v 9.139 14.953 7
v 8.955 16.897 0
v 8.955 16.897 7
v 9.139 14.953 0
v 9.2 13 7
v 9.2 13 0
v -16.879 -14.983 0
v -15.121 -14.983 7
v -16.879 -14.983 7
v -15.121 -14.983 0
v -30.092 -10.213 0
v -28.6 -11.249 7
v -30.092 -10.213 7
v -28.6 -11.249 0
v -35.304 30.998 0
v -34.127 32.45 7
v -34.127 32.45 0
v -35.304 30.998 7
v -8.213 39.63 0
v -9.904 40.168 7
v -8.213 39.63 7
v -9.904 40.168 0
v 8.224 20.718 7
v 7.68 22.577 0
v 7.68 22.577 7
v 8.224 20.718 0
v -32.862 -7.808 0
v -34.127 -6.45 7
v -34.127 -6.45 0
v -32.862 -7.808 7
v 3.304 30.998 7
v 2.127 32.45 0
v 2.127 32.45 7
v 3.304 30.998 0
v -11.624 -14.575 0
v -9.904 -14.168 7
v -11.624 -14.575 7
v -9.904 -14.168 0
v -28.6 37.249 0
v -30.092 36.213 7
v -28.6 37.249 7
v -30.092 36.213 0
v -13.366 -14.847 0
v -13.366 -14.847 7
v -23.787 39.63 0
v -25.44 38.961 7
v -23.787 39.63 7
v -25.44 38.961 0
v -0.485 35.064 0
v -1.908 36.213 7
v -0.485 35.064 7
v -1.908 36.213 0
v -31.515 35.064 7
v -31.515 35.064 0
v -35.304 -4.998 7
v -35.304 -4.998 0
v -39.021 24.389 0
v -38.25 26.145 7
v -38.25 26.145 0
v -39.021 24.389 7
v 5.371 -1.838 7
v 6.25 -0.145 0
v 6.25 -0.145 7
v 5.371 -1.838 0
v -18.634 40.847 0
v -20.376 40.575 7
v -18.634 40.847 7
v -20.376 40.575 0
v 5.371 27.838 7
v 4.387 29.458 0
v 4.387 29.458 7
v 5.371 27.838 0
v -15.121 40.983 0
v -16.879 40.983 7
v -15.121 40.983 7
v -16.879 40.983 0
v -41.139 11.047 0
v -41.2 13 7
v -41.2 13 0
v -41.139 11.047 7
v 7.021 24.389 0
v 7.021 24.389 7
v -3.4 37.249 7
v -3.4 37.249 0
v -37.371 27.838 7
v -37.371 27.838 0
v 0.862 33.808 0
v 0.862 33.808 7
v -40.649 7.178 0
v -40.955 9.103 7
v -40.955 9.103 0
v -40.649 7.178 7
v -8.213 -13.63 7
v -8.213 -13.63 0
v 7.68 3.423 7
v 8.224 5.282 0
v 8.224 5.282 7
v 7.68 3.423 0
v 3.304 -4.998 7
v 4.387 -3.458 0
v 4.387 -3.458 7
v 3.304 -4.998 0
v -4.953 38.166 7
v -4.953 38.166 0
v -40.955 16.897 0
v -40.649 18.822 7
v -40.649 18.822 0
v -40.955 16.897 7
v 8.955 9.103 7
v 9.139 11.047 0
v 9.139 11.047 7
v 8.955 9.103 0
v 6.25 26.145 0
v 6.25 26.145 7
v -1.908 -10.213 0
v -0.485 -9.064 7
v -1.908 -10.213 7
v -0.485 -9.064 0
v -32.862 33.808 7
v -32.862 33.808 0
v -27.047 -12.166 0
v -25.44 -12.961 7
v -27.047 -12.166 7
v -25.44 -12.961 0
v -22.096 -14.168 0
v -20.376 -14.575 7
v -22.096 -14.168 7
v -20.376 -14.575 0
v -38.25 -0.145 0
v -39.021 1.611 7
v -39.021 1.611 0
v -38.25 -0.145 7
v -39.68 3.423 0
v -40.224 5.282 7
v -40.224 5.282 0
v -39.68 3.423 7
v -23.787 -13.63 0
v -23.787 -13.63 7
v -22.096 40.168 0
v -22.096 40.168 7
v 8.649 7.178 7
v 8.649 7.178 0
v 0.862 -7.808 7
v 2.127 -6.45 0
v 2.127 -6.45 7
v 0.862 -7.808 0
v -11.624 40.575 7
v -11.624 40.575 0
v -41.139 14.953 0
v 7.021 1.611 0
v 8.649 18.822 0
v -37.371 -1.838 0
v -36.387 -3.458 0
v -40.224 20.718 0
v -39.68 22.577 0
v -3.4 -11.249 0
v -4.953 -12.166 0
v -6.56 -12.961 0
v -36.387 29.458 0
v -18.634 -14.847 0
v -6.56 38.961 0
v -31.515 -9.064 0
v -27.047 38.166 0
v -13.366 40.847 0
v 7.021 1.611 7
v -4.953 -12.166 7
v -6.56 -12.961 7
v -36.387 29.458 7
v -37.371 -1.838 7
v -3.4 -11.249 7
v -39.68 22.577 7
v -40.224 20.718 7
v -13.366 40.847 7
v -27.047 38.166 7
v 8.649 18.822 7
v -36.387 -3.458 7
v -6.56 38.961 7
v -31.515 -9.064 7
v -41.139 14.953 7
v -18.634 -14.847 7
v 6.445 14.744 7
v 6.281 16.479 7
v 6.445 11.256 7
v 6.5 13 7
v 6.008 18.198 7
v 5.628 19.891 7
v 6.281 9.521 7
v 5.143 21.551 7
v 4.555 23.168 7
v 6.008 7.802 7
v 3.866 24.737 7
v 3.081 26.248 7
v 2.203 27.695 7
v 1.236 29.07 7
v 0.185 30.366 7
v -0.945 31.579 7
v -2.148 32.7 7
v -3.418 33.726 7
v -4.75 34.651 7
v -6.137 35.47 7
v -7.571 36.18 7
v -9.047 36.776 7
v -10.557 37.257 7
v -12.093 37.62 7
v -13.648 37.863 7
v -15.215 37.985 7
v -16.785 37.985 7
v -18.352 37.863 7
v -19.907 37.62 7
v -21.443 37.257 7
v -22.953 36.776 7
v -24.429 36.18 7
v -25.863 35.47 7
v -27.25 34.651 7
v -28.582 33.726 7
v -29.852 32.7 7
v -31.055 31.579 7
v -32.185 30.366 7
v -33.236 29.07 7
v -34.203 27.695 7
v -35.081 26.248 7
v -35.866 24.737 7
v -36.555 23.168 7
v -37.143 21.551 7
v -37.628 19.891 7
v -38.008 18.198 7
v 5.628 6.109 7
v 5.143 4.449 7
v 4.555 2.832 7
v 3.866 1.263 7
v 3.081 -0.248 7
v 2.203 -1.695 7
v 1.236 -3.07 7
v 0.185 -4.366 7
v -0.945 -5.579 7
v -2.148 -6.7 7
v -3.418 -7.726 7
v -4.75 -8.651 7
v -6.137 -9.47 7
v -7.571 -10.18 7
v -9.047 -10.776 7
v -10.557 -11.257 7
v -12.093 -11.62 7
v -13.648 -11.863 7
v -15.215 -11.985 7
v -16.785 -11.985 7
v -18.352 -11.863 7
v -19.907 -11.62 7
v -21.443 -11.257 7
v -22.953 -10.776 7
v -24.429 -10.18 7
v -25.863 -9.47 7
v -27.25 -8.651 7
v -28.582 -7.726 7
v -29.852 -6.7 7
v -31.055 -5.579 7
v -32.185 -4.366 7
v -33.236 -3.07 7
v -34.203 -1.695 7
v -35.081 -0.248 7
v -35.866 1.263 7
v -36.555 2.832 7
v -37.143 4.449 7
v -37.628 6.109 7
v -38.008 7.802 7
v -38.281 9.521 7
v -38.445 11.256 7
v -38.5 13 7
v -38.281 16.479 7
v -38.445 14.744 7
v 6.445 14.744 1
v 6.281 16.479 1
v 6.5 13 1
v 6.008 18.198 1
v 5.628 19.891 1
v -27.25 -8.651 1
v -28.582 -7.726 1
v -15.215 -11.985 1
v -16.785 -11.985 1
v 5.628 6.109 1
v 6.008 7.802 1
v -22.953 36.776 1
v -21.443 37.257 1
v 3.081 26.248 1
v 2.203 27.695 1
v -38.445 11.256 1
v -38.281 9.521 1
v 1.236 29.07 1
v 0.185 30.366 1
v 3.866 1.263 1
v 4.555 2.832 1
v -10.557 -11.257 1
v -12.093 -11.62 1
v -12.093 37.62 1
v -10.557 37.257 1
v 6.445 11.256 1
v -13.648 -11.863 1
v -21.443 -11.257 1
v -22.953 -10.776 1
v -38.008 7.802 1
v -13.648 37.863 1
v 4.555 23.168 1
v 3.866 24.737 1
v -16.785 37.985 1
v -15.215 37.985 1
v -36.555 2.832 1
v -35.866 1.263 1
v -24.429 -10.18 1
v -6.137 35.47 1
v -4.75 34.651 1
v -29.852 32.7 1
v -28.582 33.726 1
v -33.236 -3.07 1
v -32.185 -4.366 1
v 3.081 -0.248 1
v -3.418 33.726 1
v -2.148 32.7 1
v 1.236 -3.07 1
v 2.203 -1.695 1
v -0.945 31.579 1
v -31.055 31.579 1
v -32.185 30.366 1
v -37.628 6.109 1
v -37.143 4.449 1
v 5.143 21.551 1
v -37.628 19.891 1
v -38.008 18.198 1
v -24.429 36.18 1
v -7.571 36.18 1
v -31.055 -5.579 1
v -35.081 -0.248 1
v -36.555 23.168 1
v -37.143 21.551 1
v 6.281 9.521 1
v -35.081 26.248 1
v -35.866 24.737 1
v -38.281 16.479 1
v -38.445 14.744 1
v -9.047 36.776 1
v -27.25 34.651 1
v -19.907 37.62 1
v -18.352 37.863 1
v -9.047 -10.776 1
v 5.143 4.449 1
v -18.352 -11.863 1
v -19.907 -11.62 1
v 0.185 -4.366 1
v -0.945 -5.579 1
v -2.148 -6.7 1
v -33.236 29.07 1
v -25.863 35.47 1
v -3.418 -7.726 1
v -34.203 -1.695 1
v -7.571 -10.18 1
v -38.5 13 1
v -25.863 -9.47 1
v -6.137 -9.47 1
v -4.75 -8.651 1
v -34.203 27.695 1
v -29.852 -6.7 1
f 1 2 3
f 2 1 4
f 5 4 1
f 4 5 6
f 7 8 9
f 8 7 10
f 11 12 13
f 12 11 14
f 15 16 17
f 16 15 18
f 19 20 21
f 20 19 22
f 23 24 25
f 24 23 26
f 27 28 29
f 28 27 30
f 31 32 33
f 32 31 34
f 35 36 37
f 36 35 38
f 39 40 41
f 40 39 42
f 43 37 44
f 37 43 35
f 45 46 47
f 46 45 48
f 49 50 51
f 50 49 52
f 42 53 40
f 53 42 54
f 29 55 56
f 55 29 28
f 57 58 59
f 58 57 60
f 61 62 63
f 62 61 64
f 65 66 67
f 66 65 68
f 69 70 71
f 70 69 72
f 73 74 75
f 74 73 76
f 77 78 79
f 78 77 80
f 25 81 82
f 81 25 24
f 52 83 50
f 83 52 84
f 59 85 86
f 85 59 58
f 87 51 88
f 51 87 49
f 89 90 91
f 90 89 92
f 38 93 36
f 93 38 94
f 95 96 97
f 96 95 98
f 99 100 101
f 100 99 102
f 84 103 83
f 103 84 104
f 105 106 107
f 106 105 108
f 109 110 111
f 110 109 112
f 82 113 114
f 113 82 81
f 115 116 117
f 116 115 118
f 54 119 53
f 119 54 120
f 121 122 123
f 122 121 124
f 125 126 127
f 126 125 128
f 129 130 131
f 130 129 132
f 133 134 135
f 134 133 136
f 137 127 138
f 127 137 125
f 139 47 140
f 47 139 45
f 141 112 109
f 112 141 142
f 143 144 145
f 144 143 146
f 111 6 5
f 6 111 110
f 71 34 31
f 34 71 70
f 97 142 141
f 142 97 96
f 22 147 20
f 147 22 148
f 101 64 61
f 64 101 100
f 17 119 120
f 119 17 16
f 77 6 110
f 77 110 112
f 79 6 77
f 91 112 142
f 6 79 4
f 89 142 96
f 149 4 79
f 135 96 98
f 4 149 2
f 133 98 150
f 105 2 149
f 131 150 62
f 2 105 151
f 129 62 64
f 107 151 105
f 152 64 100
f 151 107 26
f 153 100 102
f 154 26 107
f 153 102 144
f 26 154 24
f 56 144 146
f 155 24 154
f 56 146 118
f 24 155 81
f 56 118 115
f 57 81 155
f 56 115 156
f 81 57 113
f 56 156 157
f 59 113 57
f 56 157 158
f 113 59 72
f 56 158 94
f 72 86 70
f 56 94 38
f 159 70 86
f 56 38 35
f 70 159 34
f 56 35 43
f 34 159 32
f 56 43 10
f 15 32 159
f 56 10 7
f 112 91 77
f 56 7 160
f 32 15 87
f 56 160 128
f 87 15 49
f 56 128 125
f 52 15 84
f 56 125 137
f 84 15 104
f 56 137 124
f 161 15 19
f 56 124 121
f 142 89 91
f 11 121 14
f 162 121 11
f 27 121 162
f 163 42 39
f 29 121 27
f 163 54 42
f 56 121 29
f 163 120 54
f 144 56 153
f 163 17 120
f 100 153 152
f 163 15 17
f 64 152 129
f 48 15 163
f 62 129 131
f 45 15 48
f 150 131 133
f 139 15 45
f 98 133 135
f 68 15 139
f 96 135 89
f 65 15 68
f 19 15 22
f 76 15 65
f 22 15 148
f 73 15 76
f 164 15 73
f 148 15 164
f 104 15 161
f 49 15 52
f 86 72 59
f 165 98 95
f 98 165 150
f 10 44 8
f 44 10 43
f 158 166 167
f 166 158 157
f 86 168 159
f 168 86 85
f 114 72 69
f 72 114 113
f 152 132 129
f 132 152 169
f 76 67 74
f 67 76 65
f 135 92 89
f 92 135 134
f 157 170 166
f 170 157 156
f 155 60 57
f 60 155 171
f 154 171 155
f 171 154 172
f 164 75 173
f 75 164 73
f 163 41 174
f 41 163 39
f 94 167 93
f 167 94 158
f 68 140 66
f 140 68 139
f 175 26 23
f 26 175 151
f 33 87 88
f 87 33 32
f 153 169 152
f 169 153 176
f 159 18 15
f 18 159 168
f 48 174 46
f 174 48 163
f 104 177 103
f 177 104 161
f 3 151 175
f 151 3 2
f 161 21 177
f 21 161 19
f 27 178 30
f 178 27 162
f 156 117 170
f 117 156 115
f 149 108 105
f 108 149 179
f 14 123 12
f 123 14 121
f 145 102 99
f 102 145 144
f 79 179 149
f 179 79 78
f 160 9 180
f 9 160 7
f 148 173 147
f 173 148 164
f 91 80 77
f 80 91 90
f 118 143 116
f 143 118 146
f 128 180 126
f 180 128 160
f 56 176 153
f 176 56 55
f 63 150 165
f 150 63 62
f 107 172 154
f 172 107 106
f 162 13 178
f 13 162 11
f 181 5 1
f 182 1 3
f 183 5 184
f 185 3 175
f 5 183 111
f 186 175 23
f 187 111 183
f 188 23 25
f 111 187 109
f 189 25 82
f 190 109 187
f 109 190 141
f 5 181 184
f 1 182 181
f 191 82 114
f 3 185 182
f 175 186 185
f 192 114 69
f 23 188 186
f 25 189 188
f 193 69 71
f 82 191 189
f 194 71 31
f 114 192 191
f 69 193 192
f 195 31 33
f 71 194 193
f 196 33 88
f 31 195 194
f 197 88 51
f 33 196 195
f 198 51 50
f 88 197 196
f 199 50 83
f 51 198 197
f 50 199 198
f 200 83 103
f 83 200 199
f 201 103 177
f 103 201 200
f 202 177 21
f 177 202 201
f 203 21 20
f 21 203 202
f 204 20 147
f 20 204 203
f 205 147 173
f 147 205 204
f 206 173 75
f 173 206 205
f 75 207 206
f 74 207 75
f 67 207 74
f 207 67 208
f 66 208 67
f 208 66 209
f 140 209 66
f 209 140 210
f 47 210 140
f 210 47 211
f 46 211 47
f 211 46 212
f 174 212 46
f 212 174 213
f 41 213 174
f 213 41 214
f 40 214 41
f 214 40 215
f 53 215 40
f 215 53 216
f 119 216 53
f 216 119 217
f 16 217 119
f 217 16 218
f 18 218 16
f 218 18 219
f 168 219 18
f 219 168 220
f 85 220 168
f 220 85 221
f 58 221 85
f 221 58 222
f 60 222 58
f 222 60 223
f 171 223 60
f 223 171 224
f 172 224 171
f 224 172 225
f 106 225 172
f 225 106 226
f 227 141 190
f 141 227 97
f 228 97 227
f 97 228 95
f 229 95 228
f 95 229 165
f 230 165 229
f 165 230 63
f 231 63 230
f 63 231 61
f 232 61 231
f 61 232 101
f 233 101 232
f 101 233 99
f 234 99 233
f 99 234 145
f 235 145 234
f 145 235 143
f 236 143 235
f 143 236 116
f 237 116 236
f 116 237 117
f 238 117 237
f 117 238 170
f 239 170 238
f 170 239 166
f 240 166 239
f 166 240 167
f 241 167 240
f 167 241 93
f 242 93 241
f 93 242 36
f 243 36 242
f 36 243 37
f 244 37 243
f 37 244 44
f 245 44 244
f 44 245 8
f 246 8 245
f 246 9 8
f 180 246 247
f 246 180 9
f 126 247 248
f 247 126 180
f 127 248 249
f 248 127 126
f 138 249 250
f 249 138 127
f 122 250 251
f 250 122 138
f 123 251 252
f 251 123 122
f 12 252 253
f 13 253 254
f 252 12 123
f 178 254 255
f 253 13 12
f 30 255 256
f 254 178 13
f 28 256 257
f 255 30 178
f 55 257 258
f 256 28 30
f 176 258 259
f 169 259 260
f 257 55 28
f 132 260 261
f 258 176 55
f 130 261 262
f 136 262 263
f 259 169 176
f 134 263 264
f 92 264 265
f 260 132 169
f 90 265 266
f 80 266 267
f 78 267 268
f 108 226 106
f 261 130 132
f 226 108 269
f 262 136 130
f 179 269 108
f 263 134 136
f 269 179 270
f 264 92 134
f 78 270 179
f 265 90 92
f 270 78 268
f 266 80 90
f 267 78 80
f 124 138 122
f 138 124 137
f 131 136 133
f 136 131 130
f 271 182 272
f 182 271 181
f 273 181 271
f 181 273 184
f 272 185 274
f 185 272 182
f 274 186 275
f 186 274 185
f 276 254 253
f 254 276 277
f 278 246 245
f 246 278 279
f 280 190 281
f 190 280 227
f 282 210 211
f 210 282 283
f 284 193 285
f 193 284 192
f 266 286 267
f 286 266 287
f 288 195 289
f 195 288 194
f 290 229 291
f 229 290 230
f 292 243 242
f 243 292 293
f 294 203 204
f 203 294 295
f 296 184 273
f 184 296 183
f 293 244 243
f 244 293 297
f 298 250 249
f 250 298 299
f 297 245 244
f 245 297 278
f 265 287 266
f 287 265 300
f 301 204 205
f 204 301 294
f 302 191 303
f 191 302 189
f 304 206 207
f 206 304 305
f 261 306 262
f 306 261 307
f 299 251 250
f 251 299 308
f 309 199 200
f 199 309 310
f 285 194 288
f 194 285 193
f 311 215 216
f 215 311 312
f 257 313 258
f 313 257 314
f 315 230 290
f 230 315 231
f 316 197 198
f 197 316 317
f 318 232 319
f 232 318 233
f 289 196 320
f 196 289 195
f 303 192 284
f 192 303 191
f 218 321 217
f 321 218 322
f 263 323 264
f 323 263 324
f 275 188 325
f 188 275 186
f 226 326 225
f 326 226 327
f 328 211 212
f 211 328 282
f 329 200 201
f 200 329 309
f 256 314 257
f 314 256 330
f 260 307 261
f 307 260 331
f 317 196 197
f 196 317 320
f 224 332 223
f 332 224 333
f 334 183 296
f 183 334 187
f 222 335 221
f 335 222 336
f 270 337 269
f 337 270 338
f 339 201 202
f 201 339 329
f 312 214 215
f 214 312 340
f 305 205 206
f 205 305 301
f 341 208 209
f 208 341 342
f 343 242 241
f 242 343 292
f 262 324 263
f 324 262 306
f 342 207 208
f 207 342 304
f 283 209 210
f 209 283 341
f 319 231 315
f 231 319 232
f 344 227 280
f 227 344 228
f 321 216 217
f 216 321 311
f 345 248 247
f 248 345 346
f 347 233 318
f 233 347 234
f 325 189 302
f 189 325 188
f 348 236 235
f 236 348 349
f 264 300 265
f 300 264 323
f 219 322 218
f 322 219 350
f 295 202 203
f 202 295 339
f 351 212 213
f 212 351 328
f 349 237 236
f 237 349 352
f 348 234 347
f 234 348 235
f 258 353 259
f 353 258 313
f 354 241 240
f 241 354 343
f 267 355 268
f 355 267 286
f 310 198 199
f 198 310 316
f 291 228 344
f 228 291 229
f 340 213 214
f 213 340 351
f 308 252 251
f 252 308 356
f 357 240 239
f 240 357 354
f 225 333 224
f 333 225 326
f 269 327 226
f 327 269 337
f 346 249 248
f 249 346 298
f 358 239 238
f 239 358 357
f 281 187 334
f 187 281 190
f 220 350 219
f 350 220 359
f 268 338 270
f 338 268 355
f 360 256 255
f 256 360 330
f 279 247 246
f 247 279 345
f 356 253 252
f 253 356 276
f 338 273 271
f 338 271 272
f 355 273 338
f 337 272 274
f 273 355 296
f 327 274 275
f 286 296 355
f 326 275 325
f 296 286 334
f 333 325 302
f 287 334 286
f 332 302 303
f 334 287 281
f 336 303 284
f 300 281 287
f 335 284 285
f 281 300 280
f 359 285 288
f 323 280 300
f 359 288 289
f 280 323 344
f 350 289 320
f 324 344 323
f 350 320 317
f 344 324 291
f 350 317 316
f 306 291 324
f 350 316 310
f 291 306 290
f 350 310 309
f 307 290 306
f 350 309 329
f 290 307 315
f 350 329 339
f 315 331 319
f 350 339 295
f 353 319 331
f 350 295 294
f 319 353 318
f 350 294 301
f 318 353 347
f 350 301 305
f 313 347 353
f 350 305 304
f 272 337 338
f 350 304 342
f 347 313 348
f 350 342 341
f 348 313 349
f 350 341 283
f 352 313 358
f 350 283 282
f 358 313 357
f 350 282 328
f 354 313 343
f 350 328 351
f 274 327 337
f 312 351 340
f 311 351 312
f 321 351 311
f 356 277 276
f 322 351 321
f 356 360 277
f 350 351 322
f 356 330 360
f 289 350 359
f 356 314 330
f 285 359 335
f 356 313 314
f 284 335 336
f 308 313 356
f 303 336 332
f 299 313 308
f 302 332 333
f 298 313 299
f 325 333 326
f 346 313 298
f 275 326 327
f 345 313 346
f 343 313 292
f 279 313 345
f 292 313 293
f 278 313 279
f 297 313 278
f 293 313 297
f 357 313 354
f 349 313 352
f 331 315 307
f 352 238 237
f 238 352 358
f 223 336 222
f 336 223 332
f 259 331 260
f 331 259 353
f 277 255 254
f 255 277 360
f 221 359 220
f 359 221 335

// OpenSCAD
mirror([1, 0, 0]) scale([20, 20, 1]) linear_extrude(height = 3.5,  convexity = 10)
   import (file = "/input/img/outfile.dxf");
   
   translate([-16,13,0]) difference() {
       scale([0.9, 1, 1]) cylinder(7, r=28, $fn=90);
       scale([0.9, 1, 1]) translate([0, 0, 1]) cylinder(7, r=25, $fn=90);
   }
   
